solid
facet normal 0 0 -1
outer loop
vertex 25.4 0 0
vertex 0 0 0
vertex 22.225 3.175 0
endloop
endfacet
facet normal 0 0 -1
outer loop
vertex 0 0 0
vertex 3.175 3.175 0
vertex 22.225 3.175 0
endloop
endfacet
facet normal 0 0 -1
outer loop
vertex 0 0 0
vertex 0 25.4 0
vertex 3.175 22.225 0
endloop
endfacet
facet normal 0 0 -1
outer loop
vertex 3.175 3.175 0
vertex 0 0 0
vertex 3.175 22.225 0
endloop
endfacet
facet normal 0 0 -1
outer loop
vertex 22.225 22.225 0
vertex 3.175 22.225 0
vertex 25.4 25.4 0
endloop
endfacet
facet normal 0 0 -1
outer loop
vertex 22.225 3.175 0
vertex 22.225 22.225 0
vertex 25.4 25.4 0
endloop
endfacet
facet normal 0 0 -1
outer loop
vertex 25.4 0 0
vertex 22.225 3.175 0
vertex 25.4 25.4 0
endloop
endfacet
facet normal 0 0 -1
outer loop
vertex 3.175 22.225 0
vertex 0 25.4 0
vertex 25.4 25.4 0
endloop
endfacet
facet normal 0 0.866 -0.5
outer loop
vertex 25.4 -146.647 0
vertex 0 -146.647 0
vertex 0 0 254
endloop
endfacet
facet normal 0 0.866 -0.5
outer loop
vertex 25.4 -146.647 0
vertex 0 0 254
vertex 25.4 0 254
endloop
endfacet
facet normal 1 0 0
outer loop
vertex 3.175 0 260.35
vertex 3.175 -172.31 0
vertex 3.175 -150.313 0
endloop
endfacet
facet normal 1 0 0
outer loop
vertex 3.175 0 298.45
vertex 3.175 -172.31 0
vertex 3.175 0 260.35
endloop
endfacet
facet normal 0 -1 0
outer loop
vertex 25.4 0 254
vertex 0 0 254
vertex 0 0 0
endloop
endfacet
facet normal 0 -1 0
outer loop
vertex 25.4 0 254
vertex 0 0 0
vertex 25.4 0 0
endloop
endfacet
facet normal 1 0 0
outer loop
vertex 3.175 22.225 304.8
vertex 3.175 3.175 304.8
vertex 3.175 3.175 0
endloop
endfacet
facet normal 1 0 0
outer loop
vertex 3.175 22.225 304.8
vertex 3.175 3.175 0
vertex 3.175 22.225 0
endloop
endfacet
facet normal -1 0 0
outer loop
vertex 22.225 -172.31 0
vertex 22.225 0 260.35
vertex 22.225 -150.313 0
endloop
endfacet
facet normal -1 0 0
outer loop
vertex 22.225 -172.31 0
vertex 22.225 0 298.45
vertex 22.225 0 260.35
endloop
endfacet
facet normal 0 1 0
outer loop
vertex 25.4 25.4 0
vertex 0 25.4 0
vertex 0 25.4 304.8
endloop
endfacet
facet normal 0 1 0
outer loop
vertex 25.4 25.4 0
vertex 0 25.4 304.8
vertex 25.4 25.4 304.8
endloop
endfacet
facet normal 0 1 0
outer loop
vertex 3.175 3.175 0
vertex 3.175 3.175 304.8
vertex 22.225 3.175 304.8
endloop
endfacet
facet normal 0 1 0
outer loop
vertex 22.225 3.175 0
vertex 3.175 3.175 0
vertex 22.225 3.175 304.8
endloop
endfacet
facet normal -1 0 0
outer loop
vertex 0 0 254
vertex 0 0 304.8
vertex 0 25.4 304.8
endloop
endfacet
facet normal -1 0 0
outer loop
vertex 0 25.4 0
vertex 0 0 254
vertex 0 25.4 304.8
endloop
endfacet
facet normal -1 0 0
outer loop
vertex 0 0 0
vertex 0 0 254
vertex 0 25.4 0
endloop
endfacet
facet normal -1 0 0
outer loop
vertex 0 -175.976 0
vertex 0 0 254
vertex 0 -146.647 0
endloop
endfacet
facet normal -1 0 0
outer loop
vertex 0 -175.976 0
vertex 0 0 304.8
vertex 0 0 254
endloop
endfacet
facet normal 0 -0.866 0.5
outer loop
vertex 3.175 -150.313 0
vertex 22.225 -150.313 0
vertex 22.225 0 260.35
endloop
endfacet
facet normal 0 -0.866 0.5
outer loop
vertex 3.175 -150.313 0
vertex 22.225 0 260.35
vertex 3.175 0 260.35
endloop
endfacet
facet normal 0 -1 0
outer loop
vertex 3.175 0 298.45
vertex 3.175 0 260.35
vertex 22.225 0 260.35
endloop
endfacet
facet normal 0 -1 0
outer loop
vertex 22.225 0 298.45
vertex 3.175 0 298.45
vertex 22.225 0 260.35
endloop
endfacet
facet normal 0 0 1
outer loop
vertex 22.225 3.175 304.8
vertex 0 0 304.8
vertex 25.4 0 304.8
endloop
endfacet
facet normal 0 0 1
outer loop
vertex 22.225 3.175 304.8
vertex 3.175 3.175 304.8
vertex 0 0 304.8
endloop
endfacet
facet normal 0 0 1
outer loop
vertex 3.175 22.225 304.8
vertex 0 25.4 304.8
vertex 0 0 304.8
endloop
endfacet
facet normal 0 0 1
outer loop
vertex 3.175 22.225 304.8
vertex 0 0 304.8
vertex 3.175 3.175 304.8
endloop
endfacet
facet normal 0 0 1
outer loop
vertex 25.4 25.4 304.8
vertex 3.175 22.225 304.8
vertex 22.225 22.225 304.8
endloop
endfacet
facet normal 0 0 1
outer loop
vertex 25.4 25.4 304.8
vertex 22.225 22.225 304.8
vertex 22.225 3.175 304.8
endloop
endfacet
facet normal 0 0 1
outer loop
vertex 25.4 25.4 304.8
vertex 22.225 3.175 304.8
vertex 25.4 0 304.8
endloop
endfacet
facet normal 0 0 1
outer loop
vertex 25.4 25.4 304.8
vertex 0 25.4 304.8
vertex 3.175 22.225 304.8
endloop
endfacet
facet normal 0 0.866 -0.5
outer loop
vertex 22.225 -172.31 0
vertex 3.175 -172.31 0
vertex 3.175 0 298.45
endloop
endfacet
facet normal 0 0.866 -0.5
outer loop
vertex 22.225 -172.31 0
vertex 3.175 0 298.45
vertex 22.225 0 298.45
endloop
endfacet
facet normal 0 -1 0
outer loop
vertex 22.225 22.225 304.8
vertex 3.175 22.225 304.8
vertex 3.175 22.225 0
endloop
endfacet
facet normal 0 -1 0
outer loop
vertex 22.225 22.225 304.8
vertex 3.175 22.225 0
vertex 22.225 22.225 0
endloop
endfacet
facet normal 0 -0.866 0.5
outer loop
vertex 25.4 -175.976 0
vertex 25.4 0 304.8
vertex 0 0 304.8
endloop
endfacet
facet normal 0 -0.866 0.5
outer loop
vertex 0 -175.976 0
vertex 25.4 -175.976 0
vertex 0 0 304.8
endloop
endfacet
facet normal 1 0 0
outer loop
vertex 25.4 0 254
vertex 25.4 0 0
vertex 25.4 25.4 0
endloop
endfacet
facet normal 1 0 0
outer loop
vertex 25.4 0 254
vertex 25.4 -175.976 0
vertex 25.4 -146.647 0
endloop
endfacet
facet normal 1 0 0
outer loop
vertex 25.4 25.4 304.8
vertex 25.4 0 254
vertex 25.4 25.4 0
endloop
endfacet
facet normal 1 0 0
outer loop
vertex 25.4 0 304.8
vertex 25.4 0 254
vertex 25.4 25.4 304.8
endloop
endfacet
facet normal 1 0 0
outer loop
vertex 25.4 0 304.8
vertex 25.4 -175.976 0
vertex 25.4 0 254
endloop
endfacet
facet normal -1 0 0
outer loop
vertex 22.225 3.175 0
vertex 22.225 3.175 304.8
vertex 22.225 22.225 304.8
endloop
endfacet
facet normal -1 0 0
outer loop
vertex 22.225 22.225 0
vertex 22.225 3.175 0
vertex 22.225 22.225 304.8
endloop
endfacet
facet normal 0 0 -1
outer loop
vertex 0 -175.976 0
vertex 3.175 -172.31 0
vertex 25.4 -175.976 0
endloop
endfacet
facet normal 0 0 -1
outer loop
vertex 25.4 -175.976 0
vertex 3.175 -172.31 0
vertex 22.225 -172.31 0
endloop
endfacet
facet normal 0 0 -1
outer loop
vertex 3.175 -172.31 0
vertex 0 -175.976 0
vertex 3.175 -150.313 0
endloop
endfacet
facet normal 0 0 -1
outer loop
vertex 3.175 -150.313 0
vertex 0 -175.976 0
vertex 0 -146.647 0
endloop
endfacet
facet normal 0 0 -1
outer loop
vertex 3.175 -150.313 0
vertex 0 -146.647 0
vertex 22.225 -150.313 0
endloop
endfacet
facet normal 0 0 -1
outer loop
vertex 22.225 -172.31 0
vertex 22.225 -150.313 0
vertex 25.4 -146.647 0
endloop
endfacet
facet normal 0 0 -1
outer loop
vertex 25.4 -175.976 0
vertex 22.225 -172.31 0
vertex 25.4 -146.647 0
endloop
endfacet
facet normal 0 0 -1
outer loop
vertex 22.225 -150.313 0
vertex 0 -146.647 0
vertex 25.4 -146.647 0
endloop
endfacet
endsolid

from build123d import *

# Parameters (mm, degrees)
SKETCH1_W           = 25.4
SKETCH1_H           = 25.4
SKETCH1_W_2         = 19.05
SKETCH1_H_2         = 19.05
BOSS_EXTRUDE1_DEPTH = 304.8
SKETCH2_W           = 25.4
SKETCH2_H           = 50.8
SKETCH2_W_2         = 19.05
SKETCH2_H_2         = 38.1
SKETCH4_W           = 26.690109794
SKETCH4_H           = 109.792846898
CUT_EXTRUDE1_DEPTH  = 375.380835514


with BuildPart() as part:
    # Sketch1 → Boss-Extrude1 (new body)
    with BuildSketch(Plane.XY):
        with Locations((12.7, 12.7)):
            Rectangle(SKETCH1_W, SKETCH1_H)
        with Locations((12.7, 12.7)):
            Rectangle(SKETCH1_W_2, SKETCH1_H_2, mode=Mode.SUBTRACT)
    extrude(amount=BOSS_EXTRUDE1_DEPTH)

    # Sweep1: sweep along a path in Sketch3
    with BuildLine(Plane(origin=(25.4, 0, 0), x_dir=(0, 0, -1), z_dir=(1, 0, 0))) as sweep1_path:
        Line((-279.4, 0), (50.555678842, -190.5))
    # Sketch2 → Sweep1 (sweep)
    with BuildSketch(Plane.XZ):
        with Locations((12.7, 279.4)):
            Rectangle(SKETCH2_W, SKETCH2_H)
        with Locations((12.7, 279.4)):
            Rectangle(SKETCH2_W_2, SKETCH2_H_2, mode=Mode.SUBTRACT)
    sweep(path=sweep1_path.line)

    # Sketch4 → Cut-Extrude1 (cut, through all)
    with BuildSketch(Plane(origin=(0, 25.4, 0), x_dir=(1, 0, 0), z_dir=(0, 1, 0))):
        with Locations((13.345054897, 54.896423449)):
            Rectangle(SKETCH4_W, SKETCH4_H)
    extrude(amount=-CUT_EXTRUDE1_DEPTH, mode=Mode.SUBTRACT)


solid = part.part
